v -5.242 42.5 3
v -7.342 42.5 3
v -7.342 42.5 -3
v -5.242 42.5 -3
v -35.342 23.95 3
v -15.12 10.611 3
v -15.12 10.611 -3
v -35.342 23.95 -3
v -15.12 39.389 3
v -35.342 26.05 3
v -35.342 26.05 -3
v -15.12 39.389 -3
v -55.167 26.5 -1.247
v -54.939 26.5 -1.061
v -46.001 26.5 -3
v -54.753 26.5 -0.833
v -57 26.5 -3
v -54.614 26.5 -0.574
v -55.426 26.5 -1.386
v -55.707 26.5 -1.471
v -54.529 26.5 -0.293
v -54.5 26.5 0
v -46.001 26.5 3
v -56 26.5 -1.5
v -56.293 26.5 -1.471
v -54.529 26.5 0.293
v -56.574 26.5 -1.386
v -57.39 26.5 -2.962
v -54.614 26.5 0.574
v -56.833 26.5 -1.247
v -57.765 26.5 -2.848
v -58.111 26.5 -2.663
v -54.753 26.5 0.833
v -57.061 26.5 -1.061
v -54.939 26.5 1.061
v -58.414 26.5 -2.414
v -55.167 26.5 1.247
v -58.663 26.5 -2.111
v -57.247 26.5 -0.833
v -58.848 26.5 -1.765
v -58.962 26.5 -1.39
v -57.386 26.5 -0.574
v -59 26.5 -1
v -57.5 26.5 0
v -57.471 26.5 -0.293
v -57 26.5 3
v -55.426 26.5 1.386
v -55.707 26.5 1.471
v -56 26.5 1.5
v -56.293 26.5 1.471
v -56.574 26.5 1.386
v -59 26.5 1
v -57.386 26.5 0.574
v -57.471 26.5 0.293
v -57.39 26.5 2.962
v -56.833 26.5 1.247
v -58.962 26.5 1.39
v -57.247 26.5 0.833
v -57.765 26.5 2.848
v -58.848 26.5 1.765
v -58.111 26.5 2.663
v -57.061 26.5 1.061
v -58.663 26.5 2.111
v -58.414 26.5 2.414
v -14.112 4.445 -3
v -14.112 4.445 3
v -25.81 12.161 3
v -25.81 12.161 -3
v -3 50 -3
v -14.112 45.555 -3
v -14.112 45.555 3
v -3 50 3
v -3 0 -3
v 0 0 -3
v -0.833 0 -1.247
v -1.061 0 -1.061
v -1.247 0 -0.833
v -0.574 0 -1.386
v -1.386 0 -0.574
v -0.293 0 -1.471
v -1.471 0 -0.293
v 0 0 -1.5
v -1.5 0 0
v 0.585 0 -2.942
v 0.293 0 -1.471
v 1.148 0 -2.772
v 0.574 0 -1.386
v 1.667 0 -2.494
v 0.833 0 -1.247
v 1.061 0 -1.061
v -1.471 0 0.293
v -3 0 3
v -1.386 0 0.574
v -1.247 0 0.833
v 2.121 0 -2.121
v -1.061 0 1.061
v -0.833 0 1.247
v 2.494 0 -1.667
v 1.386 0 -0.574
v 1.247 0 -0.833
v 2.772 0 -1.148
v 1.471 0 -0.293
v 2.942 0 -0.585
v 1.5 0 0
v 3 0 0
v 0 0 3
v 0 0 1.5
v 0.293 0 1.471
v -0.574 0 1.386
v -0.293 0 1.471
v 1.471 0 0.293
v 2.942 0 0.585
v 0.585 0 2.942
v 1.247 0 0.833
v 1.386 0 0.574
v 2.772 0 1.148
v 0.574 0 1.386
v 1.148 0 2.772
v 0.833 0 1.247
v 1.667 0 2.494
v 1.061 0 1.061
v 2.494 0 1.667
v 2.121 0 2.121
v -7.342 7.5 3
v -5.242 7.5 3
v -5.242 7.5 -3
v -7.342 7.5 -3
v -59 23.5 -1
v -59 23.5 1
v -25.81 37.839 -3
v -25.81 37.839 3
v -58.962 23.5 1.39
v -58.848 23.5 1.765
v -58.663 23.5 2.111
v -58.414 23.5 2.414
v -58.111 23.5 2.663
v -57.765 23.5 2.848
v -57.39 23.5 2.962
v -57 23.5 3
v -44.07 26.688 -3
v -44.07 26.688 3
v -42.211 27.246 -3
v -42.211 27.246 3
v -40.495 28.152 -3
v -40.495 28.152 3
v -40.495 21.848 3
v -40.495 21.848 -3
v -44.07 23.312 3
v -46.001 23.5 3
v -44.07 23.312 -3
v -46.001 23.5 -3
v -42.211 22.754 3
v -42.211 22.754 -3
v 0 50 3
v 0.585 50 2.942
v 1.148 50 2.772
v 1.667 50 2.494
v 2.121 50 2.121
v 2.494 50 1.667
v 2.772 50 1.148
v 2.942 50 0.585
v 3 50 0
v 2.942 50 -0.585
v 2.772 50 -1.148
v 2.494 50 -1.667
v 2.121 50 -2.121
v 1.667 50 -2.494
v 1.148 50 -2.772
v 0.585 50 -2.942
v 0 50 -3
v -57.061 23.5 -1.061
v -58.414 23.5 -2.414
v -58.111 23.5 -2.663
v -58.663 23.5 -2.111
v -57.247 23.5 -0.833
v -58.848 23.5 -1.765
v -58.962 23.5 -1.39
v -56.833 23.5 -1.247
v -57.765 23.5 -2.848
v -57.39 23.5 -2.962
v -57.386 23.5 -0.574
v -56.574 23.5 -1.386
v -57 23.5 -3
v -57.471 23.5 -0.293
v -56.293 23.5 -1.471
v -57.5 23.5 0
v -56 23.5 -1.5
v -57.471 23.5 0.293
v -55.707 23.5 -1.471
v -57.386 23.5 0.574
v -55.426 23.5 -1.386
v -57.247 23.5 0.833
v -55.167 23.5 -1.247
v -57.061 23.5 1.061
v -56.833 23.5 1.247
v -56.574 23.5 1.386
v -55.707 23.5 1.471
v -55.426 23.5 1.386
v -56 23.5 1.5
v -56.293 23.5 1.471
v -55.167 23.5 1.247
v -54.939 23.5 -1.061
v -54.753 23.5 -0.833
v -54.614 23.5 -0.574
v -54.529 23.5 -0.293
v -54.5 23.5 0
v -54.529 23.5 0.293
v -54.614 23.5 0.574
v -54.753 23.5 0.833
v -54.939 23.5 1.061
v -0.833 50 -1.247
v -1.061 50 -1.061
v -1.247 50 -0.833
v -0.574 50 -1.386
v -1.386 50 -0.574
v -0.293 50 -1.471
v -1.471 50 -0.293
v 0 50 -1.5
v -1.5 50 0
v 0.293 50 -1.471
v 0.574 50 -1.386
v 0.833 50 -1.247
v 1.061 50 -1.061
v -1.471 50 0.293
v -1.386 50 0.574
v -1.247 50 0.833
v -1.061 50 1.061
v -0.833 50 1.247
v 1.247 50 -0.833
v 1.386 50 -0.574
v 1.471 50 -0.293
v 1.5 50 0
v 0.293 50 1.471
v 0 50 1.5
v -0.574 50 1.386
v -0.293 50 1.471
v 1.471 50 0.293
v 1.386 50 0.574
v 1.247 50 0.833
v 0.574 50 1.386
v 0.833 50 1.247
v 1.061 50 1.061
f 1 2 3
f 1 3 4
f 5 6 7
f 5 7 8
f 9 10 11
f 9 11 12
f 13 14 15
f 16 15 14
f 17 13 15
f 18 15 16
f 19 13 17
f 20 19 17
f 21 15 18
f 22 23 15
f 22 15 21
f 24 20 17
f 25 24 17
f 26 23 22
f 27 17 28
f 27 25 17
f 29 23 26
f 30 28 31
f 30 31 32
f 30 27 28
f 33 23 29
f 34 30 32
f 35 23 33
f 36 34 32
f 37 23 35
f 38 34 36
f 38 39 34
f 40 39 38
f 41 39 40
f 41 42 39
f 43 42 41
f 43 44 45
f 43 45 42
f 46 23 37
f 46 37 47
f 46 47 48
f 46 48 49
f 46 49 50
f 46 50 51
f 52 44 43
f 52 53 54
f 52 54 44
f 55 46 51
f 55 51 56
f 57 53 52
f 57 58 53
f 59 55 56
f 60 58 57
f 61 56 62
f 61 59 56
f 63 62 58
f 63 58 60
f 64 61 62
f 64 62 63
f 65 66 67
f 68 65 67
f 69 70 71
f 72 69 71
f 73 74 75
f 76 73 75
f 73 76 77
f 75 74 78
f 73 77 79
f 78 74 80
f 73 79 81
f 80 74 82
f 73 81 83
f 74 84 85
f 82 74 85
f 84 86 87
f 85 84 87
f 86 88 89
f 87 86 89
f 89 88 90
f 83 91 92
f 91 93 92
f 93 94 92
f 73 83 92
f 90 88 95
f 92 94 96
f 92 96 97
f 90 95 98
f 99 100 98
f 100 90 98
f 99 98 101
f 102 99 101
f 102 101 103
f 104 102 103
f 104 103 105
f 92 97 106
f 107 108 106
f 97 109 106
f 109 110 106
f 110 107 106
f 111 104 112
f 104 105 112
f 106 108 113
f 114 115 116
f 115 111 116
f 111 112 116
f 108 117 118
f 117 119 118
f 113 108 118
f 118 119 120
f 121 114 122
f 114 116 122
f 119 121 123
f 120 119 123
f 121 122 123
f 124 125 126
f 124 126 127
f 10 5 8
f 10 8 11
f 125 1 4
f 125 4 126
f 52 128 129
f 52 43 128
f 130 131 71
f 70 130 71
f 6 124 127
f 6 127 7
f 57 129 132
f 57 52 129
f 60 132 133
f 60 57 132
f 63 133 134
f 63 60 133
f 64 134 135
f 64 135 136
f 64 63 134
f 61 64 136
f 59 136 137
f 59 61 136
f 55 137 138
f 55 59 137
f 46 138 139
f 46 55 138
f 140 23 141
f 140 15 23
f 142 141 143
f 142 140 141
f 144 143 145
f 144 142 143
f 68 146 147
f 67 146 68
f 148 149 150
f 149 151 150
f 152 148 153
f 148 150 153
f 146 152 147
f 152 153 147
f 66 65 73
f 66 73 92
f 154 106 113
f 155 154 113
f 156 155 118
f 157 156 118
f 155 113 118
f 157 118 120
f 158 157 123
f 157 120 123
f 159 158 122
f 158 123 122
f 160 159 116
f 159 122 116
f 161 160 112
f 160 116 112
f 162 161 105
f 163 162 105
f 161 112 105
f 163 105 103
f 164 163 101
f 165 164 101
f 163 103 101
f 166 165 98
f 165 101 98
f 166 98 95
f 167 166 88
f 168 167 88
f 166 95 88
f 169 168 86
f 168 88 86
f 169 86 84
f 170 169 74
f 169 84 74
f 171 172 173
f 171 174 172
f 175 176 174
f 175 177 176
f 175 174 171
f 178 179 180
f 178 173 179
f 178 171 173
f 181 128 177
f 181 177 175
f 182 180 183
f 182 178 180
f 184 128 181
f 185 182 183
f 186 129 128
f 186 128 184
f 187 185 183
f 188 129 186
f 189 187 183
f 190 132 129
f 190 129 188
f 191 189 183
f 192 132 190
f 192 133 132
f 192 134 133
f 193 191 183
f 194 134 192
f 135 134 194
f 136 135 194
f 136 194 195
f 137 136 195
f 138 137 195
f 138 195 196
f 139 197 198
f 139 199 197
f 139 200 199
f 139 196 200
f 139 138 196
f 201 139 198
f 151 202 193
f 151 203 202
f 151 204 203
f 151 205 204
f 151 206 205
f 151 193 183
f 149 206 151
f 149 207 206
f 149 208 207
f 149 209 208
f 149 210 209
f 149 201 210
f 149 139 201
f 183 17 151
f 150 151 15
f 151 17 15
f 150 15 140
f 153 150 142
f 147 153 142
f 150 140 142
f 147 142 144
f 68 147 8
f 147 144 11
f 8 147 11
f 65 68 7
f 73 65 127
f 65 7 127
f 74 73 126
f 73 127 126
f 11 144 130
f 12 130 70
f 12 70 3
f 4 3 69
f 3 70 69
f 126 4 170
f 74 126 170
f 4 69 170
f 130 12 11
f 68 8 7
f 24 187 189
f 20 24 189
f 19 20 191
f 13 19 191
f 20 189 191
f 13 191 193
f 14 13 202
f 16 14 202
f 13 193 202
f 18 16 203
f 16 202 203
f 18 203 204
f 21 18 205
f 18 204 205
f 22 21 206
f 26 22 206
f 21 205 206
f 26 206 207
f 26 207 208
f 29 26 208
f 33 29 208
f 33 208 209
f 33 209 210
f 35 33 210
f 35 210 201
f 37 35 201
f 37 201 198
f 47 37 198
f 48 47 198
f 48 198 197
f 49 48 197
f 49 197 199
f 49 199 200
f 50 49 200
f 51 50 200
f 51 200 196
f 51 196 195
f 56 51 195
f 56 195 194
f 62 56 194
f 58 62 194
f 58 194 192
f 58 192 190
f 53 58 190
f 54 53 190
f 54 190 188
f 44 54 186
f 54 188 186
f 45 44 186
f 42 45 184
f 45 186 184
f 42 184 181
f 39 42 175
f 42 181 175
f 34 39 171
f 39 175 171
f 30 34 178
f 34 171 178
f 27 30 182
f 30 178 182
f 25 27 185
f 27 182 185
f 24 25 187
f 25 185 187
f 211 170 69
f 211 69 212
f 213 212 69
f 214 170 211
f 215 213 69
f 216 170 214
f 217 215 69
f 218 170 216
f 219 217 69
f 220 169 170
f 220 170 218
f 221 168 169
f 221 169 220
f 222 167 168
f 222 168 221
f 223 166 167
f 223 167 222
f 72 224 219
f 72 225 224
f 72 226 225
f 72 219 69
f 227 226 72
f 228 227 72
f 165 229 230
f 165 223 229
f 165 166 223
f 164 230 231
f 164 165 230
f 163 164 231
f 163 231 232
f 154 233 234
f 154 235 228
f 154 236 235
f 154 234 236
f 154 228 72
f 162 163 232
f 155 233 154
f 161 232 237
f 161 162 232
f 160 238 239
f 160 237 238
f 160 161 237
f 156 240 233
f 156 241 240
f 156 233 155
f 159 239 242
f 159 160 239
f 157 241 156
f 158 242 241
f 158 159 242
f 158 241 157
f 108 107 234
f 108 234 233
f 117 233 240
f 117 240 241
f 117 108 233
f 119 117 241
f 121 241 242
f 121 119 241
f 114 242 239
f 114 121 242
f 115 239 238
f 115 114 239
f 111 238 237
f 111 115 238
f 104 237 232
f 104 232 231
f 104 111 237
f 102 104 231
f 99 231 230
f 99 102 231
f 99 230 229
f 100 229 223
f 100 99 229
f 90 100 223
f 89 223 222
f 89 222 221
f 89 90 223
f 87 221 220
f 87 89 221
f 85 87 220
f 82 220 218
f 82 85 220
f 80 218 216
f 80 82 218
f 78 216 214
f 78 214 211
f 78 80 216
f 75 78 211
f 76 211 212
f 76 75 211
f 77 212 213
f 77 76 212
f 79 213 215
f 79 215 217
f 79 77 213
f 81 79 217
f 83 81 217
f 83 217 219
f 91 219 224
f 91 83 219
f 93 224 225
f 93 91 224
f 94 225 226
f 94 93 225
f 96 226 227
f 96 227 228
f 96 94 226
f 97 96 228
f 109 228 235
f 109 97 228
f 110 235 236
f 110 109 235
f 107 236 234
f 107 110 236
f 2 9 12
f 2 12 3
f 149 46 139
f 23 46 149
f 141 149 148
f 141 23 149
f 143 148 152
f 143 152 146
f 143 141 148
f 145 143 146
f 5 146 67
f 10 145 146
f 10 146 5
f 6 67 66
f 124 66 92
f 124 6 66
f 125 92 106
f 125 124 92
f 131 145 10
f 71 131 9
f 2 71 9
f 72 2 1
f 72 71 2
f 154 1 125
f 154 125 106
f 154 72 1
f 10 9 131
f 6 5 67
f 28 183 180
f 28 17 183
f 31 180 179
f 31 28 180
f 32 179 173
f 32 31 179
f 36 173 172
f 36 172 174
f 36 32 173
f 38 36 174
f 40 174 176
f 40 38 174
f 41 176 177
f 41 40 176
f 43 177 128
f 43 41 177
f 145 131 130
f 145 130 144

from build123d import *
from OCP.BRepFilletAPI import BRepFilletAPI_MakeChamfer

# Parameters (mm, degrees)
SKETCH1_R           = 1.5
BOSS_EXTRUDE1_DEPTH = 50
SKETCH2_W           = 6
SKETCH2_H           = 50
BOSS_EXTRUDE2_DEPTH = 50
CHAMFER1_SIZE       = 50
CHAMFER1_SIZE2      = 20
SKETCH4_W           = 6
SKETCH4_H           = 3
BOSS_EXTRUDE3_DEPTH = 6
SKETCH5_R           = 1.5
CUT_EXTRUDE1_DEPTH  = 65.747586828
CHAMFER2_SIZE       = 1
CHAMFER2_SIZE2      = 1.795054936
FILLET1_R           = 2
CUT_EXTRUDE2_DEPTH  = 6
CUT_EXTRUDE3_DEPTH  = 78.569323834
BOSS_EXTRUDE5_DEPTH = 6
CUT_EXTRUDE4_DEPTH  = 78.569323834
FILLET2_R           = 10


with BuildPart() as part:
    # Sketch1 → Boss-Extrude1 (new body)
    with BuildSketch(Plane(origin=(0, 0, 0), x_dir=(1, 0, 0), z_dir=(0, 1, 0))):
        with BuildLine():
            Line((0, 3), (-3, 3))
            Line((-3, 3), (-3, -3))
            Line((-3, -3), (0, -3))
            ThreePointArc((0, -3), (3, 0), (0, 3))
        make_face()
        with Locations(Location((0, 0, 0), (0, 0, 270))):
            Circle(SKETCH1_R, mode=Mode.SUBTRACT)
    extrude(amount=BOSS_EXTRUDE1_DEPTH)

    # Sketch2 → Boss-Extrude2 (add)
    with BuildSketch(Plane.ZY.offset(3)):
        with Locations((0, 25)):
            Rectangle(SKETCH2_W, SKETCH2_H)
    extrude(amount=BOSS_EXTRUDE2_DEPTH)

    # Chamfer1: one chamfer whose edges measure the first distance from different faces: ONE call of the kernel's chamfer builder (chamfer() names one face for all edges)
    chamfer1_edges_1 = [part.edges().sort_by_distance(p)[0] for p in [
        (-53, 50, 0),
    ]]
    chamfer1_side_1 = [part.faces().sort_by_distance(p)[0] for p in [
        (-25.86838725, 50, 0),
    ]]
    chamfer1_edges_2 = [part.edges().sort_by_distance(p)[0] for p in [
        (-53, 0, 0),
    ]]
    chamfer1_side_2 = [part.faces().sort_by_distance(p)[0] for p in [
        (-25.86838725, 0, 0),
    ]]
    chamfer1 = BRepFilletAPI_MakeChamfer(part.part.solid().wrapped)
    for e in chamfer1_edges_1:
        chamfer1.Add(CHAMFER1_SIZE, CHAMFER1_SIZE2, e.wrapped, chamfer1_side_1[0].wrapped)  # the first distance lies on this face
    for e in chamfer1_edges_2:
        chamfer1.Add(CHAMFER1_SIZE, CHAMFER1_SIZE2, e.wrapped, chamfer1_side_2[0].wrapped)  # the first distance lies on this face
    add(Compound.cast(chamfer1.Shape()), mode=Mode.REPLACE)

    # Sketch4 → Boss-Extrude3 (add)
    with BuildSketch(Plane.ZY.offset(53)):
        with Locations((0, 25)):
            Rectangle(SKETCH4_W, SKETCH4_H)
    extrude(amount=BOSS_EXTRUDE3_DEPTH)

    # Sketch5 → Cut-Extrude1 (cut, through all)
    with BuildSketch(Plane.XZ.offset(-23.5)):
        with Locations(Location((-56, 0, 0), (0, 0, 270))):
            Circle(SKETCH5_R)
    extrude(amount=-CUT_EXTRUDE1_DEPTH, mode=Mode.SUBTRACT)

    # Chamfer2: one chamfer whose edges measure the first distance from different faces: ONE call of the kernel's chamfer builder (chamfer() names one face for all edges)
    chamfer2_edges_1 = [part.edges().sort_by_distance(p)[0] for p in [
        (-53, 30, 0),
    ]]
    chamfer2_side_1 = [part.faces().sort_by_distance(p)[0] for p in [
        (-28, 40, 0),
    ]]
    chamfer2_edges_2 = [part.edges().sort_by_distance(p)[0] for p in [
        (-53, 20, 0),
    ]]
    chamfer2_side_2 = [part.faces().sort_by_distance(p)[0] for p in [
        (-28, 10, 0),
    ]]
    chamfer2 = BRepFilletAPI_MakeChamfer(part.part.solid().wrapped)
    for e in chamfer2_edges_1:
        chamfer2.Add(CHAMFER2_SIZE, CHAMFER2_SIZE2, e.wrapped, chamfer2_side_1[0].wrapped)  # the first distance lies on this face
    for e in chamfer2_edges_2:
        chamfer2.Add(CHAMFER2_SIZE, CHAMFER2_SIZE2, e.wrapped, chamfer2_side_2[0].wrapped)  # the first distance lies on this face
    add(Compound.cast(chamfer2.Shape()), mode=Mode.REPLACE)

    # Fillet1
    fillet1_edges = [part.edges().sort_by_distance(p)[0] for p in [
        (-59, 25, 3),
        (-59, 25, -3),
    ]]
    fillet(fillet1_edges, radius=FILLET1_R)

    # Sketch6 → Cut-Extrude2 (cut)
    with BuildSketch(Plane.XY.offset(3)):
        Polygon((-7.907152331, 5), (-5.507152331, 5), (-5.507152331, 45), (-7.907152331, 45), (-47.164370978, 29.297112541), (-47.907152331, 27.563956051), (-47.907152331, 22.436043949), (-47.164370978, 20.702887459), align=None)
    extrude(amount=-CUT_EXTRUDE2_DEPTH, mode=Mode.SUBTRACT)

    # Sketch7 → Cut-Extrude3 (cut, through all)
    with BuildSketch(Plane.XY.offset(3)):
        Polygon((-53, 28.204945064), (-53, 26.5), (-47.907152331, 26.5), (-47.907152331, 27.563956051), (-47.164370978, 29.297112541), (-25.810496084, 37.838662499), (-14.112413915, 45.555034434), (-52.071523309, 30.371390676), align=None)
        Polygon((-47.907152331, 23.5), (-53, 23.5), (-53, 21.795054936), (-52.071523309, 19.628609324), (-14.112413915, 4.444965566), (-25.810496084, 12.161337501), (-47.164370978, 20.702887459), (-47.907152331, 22.436043949), align=None)
    extrude(amount=-CUT_EXTRUDE3_DEPTH, mode=Mode.SUBTRACT)


with BuildPart() as cut_extrude3_piece_1:
    # of the separate pieces the step leaves, piece 1, a body of its own (cut_extrude3_pieces)
    add(part.part.solids().sort_by_distance((-3, 50, -3))[0])



with BuildPart() as cut_extrude3_piece_2:
    # of the separate pieces the step leaves, piece 2, a body of its own (cut_extrude3_pieces)
    add(part.part.solids().sort_by_distance((-57, 26.5, -3))[0])


with BuildPart() as cut_extrude3_piece_1_1:
    add(cut_extrude3_piece_1.part)

    add(cut_extrude3_piece_2.part)  # Boss-Extrude5 merges Cut-Extrude3 piece 2
    # Sketch7<3> → Boss-Extrude5 (add)
    with BuildSketch(Plane.XY.offset(3)):
        Polygon((-43, 26.5), (-53, 26.5), (-53, 23.5), (-43, 23.5), (-14.112413915, 4.444965566), (-3, 0), (-3, 50), (-14.112413915, 45.555034434), align=None)
    extrude(amount=-BOSS_EXTRUDE5_DEPTH)

    # Sketch8 → Cut-Extrude4 (cut, through all)
    with BuildSketch(Plane.XY.offset(3)):
        Polygon((-35.341555741, 26.05), (-15.120245482, 39.388524104), (-7.341555741, 42.5), (-5.241555741, 42.5), (-5.241555741, 7.5), (-7.341555741, 7.5), (-15.120245482, 10.611475896), (-35.341555741, 23.95), align=None)
    extrude(amount=-CUT_EXTRUDE4_DEPTH, mode=Mode.SUBTRACT)

    # Fillet2
    fillet2_edges = [cut_extrude3_piece_1_1.edges().sort_by_distance(p)[0] for p in [
        (-43, 23.5, 0),
        (-43, 26.5, 0),
    ]]
    fillet(fillet2_edges, radius=FILLET2_R)


solid = cut_extrude3_piece_1_1.part
